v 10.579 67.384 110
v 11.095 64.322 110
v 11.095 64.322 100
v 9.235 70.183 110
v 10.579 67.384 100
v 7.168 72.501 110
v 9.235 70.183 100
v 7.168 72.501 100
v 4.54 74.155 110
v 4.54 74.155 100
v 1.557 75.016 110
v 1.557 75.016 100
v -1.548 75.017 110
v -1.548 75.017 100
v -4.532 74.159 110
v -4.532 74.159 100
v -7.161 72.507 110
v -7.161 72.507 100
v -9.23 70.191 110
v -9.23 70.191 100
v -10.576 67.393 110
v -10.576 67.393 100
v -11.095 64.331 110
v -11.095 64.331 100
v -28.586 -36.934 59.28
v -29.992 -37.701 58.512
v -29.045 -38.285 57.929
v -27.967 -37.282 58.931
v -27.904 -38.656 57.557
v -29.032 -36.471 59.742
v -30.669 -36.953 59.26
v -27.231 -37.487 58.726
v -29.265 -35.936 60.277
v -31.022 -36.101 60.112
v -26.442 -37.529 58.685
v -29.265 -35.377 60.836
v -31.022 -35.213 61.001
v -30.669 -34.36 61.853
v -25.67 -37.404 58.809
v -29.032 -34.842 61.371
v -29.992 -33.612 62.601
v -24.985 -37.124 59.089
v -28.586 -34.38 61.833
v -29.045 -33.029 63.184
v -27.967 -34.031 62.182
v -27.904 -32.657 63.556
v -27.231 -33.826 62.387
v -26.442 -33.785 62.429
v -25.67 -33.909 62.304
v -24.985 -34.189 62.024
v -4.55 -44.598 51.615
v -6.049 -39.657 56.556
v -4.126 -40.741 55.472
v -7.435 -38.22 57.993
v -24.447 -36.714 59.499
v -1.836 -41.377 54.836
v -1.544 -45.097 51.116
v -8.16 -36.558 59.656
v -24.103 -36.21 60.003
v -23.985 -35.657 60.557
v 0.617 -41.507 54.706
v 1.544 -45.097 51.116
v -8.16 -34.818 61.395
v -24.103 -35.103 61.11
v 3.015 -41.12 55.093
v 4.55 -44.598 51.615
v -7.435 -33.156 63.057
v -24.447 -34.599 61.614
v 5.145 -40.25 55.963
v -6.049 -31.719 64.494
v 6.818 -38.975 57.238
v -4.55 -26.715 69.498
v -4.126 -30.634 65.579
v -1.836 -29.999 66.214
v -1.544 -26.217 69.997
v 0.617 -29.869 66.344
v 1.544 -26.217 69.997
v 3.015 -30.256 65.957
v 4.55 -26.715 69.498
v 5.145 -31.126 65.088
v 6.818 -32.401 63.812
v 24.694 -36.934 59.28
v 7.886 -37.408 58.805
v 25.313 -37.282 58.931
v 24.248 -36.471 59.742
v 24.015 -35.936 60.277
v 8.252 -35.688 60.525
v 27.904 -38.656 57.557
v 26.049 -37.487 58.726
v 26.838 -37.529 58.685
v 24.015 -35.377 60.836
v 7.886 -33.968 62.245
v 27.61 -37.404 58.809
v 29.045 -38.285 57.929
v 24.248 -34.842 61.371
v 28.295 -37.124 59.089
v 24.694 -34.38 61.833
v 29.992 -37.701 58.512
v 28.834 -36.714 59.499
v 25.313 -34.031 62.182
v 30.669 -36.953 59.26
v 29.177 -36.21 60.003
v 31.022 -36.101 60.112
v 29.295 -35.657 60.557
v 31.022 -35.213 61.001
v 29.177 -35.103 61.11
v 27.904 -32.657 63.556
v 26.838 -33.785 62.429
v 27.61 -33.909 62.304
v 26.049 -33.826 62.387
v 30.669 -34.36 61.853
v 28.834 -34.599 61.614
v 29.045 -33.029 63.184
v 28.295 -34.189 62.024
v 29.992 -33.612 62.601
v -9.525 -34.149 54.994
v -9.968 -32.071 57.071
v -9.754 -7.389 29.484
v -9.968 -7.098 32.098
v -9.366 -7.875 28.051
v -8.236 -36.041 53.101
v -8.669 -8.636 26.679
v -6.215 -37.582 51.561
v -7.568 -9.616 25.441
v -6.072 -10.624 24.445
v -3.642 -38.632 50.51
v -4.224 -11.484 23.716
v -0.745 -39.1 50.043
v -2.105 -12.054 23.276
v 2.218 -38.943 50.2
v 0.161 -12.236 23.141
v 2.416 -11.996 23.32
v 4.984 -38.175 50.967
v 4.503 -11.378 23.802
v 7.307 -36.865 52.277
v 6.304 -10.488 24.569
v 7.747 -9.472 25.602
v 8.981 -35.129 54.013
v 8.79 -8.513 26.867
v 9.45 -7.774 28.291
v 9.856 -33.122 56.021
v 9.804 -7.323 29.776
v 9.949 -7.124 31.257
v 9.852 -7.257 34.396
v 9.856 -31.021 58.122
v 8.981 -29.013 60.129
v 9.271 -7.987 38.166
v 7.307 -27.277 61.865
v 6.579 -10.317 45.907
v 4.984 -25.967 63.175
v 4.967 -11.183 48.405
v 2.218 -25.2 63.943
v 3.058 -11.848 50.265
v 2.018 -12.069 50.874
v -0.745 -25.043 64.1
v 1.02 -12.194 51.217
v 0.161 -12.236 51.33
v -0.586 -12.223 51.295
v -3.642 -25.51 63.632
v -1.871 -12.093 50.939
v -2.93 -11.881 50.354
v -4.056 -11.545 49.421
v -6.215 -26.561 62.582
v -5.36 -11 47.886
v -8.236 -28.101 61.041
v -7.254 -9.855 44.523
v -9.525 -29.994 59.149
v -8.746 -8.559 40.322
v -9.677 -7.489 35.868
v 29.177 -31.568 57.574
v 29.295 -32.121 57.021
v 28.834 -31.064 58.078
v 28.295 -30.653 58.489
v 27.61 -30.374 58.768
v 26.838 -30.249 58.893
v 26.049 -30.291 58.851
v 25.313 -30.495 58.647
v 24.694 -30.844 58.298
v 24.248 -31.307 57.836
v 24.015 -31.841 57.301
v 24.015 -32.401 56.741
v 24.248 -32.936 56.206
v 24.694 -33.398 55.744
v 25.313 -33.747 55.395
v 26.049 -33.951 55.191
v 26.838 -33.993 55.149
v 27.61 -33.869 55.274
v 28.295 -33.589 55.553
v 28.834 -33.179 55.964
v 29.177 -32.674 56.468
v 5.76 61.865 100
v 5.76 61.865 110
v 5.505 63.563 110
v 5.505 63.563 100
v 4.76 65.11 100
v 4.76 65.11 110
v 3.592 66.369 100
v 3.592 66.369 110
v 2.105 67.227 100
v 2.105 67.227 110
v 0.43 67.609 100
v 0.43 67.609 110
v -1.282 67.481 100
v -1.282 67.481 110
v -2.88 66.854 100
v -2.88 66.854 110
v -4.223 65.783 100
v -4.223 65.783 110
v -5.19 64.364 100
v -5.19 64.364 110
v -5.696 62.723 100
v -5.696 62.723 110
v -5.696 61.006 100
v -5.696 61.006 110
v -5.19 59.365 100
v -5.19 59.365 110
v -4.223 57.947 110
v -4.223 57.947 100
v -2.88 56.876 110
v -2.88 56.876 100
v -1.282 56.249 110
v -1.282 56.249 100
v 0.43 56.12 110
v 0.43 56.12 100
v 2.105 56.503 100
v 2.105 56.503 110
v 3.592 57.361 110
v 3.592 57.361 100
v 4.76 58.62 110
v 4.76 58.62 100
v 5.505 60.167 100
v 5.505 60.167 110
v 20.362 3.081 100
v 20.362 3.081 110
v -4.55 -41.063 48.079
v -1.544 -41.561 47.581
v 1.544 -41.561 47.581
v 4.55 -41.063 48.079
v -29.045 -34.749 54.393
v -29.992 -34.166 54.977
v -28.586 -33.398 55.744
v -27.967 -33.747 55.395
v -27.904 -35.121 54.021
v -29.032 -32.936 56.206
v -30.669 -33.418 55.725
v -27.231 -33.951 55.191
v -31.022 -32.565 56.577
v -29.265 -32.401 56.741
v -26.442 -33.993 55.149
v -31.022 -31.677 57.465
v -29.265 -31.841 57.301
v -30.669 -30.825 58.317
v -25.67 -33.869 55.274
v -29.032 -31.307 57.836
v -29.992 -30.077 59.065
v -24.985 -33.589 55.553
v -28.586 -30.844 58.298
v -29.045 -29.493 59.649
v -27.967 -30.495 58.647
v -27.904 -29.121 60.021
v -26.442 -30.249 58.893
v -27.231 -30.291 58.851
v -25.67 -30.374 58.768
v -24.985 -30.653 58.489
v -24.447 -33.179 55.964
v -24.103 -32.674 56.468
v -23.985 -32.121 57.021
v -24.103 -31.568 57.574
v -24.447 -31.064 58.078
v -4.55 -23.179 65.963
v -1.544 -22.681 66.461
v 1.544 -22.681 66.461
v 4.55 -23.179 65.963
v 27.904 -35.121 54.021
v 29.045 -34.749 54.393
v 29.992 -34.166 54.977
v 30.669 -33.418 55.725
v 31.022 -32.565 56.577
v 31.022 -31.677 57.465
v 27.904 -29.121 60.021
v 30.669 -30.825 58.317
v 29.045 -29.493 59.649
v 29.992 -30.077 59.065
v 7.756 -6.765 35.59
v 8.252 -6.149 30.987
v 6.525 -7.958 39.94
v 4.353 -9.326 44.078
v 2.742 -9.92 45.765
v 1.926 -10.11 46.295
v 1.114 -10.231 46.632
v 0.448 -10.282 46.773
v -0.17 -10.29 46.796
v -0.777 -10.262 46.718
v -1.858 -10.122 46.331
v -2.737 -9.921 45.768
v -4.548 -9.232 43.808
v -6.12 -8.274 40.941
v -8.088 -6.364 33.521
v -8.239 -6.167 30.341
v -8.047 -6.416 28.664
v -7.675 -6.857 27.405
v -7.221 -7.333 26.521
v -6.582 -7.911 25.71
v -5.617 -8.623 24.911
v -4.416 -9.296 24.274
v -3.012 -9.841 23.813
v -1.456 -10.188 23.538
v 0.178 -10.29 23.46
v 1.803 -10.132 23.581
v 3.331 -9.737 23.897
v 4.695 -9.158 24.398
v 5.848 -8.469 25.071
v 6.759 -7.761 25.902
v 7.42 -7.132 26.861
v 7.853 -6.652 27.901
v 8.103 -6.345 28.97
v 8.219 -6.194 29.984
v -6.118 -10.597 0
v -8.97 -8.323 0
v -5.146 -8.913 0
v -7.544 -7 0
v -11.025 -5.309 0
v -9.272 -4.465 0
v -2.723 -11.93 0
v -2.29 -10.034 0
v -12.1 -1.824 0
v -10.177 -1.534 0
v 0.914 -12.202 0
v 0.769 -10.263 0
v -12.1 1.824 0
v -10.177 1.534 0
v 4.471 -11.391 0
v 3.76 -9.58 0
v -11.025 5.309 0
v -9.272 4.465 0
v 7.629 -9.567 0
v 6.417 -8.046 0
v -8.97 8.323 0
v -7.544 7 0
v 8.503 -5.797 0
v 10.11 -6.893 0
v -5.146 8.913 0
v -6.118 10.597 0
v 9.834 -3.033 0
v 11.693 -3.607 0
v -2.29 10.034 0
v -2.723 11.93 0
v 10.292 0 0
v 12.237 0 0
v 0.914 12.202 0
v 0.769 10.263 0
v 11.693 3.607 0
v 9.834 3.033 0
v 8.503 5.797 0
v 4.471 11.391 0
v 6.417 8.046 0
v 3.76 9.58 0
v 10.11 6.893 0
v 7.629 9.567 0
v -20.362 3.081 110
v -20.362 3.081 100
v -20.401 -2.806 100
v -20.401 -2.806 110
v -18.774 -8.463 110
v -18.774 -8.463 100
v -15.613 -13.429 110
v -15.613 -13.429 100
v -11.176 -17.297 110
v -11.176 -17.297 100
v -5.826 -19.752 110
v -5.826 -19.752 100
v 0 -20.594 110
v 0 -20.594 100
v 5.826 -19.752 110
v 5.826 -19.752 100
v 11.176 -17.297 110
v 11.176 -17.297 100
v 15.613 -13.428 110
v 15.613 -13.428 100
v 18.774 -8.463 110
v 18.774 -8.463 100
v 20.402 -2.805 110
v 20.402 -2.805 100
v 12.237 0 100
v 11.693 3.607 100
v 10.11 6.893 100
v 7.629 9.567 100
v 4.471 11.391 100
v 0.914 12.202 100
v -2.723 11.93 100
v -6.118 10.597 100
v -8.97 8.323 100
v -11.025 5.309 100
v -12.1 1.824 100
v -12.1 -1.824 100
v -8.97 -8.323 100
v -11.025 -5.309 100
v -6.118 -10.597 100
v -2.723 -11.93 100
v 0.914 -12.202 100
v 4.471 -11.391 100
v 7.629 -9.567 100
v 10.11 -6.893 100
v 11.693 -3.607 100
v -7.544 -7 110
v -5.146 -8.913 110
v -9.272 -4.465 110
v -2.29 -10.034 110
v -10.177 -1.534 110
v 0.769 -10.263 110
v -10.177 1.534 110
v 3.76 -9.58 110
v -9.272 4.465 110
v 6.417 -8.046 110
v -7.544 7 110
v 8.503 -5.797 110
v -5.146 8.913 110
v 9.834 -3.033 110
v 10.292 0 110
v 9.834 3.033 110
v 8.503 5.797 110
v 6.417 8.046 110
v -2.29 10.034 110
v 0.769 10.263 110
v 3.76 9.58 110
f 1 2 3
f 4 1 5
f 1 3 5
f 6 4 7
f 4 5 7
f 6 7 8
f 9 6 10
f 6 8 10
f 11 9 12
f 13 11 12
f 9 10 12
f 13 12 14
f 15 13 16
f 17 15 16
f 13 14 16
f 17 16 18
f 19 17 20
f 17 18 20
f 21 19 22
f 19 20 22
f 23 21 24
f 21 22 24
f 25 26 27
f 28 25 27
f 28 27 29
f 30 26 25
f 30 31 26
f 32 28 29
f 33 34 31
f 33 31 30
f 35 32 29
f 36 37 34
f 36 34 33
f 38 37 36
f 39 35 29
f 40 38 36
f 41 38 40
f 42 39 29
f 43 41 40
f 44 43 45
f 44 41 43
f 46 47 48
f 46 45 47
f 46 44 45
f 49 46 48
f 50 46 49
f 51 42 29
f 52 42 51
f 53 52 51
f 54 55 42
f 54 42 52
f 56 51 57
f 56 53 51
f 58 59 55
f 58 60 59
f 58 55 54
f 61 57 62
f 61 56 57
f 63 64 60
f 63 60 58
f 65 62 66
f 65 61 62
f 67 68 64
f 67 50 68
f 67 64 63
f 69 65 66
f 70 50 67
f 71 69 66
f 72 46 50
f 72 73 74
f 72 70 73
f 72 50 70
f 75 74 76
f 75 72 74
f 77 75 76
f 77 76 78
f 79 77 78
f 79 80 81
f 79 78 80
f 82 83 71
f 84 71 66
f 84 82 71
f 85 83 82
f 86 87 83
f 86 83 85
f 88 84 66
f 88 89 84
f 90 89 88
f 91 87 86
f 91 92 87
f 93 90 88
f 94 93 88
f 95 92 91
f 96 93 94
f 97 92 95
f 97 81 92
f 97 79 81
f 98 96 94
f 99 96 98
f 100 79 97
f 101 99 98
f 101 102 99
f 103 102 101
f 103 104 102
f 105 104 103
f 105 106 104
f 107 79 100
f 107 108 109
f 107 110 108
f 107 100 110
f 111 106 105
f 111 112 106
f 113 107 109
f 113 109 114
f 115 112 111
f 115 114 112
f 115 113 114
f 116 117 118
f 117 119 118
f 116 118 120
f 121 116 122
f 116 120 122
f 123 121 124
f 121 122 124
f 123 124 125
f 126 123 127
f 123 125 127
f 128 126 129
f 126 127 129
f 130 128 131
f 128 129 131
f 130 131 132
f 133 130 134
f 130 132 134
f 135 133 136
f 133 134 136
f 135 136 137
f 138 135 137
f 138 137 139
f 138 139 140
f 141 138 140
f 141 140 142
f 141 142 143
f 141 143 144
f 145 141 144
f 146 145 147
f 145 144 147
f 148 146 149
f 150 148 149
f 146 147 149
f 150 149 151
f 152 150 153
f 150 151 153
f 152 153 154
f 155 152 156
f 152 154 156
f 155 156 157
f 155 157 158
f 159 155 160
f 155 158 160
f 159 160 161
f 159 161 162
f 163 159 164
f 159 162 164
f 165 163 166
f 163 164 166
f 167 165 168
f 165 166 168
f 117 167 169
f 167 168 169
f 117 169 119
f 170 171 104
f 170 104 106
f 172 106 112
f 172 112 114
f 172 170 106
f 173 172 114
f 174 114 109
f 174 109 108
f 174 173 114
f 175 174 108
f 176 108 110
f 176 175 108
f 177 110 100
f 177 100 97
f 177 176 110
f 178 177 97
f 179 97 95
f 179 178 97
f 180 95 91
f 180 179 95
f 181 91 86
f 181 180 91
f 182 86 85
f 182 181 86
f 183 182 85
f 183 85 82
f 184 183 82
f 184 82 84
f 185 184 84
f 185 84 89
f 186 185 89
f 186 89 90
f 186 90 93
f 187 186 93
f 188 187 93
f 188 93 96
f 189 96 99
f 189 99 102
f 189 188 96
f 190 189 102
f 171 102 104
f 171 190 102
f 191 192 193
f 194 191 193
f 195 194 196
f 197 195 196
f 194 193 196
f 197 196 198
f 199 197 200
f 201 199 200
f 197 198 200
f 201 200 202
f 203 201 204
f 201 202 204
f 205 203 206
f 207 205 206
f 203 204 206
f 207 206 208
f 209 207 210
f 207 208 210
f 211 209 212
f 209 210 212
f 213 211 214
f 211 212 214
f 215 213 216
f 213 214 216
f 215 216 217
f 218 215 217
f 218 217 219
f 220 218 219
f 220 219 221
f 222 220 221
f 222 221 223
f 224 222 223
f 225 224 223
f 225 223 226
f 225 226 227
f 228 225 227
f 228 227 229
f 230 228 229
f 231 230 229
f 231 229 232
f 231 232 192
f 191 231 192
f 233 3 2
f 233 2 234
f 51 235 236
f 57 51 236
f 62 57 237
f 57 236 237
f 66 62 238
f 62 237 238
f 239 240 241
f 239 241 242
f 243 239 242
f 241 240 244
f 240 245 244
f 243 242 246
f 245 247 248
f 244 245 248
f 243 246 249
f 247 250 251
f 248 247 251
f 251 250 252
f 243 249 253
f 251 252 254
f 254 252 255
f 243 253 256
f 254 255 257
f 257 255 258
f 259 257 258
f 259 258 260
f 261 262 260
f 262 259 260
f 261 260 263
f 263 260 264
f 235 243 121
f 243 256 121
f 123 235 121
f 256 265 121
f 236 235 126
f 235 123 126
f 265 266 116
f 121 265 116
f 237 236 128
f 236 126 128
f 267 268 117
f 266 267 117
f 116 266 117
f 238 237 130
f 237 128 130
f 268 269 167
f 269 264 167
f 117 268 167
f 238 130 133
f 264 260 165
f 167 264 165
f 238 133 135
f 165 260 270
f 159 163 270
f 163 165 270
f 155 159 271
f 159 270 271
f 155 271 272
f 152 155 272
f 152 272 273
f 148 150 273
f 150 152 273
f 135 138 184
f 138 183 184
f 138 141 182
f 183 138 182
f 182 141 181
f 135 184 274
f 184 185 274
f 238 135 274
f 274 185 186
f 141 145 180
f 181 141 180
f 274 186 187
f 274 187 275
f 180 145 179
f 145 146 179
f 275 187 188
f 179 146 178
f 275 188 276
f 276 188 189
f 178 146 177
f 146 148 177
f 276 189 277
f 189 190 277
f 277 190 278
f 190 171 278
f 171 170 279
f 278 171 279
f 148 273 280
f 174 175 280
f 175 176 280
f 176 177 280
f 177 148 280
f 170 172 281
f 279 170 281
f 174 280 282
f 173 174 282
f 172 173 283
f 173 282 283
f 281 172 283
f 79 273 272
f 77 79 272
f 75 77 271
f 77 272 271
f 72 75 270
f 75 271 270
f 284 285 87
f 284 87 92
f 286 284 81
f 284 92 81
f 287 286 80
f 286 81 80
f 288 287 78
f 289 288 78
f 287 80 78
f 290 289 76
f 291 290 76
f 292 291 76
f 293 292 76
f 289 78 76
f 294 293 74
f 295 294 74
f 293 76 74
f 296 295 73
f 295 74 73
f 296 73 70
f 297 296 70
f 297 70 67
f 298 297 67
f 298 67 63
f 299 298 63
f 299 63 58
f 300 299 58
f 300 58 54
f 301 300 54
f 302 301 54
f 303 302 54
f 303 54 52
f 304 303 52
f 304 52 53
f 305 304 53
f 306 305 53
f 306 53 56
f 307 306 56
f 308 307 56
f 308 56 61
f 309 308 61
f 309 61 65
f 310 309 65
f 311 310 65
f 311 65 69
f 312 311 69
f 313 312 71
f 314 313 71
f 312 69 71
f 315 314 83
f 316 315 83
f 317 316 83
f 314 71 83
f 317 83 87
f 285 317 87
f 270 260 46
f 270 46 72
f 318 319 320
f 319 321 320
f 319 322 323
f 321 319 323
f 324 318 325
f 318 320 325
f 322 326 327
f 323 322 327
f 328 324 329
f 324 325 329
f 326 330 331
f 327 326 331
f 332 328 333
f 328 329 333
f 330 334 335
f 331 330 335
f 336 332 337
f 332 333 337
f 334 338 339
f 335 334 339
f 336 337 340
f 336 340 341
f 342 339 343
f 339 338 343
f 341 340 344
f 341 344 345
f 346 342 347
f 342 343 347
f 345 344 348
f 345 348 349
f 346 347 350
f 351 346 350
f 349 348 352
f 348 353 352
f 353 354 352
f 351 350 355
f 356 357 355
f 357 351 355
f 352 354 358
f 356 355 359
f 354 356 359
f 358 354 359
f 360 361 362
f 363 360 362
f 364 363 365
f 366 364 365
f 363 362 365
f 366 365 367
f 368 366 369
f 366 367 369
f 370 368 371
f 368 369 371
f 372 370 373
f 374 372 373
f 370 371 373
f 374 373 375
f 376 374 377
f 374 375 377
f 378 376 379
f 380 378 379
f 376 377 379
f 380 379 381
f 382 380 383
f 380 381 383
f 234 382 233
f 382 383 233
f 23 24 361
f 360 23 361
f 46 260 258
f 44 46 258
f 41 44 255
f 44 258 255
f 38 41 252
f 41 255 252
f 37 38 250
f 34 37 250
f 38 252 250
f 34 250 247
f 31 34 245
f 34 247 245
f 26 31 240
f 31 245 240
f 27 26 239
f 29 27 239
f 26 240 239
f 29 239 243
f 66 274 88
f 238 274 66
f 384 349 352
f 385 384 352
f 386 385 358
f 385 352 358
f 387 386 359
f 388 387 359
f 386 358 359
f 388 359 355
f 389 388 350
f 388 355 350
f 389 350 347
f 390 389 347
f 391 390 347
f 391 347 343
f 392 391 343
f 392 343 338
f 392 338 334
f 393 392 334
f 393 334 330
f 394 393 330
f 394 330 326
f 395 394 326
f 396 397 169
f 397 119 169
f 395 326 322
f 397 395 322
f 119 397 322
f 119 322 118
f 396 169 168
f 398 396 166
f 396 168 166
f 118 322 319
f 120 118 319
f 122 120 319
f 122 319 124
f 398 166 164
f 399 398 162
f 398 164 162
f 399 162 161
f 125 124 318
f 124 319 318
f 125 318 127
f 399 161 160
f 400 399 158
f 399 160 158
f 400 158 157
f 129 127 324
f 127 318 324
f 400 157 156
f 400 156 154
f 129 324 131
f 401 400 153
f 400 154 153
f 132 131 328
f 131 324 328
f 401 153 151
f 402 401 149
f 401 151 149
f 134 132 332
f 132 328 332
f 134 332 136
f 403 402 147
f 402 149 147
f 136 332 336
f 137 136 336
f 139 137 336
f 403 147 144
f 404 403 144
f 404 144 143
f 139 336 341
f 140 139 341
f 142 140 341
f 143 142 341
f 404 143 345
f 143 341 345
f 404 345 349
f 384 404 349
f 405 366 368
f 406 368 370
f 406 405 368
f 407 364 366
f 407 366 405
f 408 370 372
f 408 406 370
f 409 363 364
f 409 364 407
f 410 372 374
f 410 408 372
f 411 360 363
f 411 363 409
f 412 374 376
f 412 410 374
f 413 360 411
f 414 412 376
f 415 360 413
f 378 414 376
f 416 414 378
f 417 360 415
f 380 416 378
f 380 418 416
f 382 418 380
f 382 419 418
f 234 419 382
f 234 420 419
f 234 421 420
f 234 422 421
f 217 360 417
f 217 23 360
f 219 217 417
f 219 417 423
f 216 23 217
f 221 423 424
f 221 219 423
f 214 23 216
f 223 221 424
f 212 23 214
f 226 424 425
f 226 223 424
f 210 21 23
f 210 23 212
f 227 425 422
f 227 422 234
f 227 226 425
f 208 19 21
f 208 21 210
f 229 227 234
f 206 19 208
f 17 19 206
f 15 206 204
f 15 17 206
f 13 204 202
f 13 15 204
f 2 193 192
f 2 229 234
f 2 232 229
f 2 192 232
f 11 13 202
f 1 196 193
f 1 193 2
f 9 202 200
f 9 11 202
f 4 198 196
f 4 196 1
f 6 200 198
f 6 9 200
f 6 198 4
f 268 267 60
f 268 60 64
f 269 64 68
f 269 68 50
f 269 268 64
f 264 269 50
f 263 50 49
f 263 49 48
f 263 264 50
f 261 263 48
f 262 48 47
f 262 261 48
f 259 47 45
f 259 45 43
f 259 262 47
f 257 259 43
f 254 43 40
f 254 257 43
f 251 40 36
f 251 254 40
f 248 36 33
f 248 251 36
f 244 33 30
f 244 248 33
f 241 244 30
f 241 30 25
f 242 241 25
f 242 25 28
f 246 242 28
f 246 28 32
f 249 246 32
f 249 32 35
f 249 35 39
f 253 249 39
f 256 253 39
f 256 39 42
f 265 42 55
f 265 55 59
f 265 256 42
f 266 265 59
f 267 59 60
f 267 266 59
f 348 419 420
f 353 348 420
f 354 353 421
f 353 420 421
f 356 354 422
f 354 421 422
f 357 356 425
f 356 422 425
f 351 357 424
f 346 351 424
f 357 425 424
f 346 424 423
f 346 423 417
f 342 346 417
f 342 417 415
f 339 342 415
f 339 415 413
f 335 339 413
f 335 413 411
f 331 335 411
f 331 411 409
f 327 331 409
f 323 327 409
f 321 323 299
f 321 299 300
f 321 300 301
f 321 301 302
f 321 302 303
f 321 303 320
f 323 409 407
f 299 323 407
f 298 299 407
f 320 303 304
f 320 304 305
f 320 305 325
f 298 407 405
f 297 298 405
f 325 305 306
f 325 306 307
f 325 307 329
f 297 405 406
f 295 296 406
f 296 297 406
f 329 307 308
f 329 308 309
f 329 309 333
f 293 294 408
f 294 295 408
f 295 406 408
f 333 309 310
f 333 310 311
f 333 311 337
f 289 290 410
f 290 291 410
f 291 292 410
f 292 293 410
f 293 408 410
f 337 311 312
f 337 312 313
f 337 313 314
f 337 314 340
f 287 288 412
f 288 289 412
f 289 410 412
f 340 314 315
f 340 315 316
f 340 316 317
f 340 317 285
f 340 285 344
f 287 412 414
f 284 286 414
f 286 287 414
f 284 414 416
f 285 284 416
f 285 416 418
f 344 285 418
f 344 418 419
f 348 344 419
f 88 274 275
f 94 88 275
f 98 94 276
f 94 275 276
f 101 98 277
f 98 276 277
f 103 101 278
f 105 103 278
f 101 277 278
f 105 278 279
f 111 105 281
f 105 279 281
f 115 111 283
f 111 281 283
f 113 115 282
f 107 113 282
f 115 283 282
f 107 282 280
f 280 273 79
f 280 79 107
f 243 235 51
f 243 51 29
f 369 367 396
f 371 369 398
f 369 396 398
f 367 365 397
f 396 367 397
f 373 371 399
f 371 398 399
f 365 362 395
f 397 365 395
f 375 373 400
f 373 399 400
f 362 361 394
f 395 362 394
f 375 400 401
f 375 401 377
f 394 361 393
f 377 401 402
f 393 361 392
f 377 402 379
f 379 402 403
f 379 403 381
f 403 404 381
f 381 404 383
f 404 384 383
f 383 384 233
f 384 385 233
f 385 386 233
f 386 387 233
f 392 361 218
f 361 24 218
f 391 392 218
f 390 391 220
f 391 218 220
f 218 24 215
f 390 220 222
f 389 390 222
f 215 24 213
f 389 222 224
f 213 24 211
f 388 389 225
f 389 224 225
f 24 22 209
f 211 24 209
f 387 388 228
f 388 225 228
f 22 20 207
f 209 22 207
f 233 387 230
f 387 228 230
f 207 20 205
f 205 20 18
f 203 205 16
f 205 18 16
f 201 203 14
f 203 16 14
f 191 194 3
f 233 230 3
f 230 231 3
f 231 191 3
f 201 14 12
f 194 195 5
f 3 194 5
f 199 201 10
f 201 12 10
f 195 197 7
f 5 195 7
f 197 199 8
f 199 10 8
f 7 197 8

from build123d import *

# Parameters (mm, degrees)
SKETCH_R          = 12.236691
PAD_DEPTH         = 100
PAD001_DEPTH      = 10
SKETCH002_R       = 9.967721
PAD002_DEPTH      = 31
PAD002_DEPTH_BACK = -10
SKETCH003_R       = 2.654836
PAD003_DEPTH      = 5
SKETCH004_R       = 10.291555
SKETCH004_R_2     = 5.760448
POCKET_DEPTH      = 110.001
SKETCH005_R       = 8.252369
POCKET001_DEPTH   = 56


with BuildPart() as part:
    # Sketch → Pad (new body)
    with BuildSketch(Plane.XY):
        Circle(SKETCH_R)
    extrude(amount=PAD_DEPTH)

    # Sketch001 (on Face3 of Pad) → Pad001 (join)
    with BuildSketch(Plane.XY.offset(100)):
        with BuildLine():
            ThreePointArc((-20.361812, 3.080584), (0.000187, -20.593527), (20.361756, 3.080953))
            Line((11.095306, 64.322127), (20.361756, 3.080953))
            ThreePointArc((11.095306, 64.322127), (0.004574, 75.125929), (-11.095059, 64.33127))
            Line((-11.095059, 64.33127), (-20.361812, 3.080584))
        make_face()
    extrude(amount=PAD001_DEPTH)

    # Sketch002 (on DatumPlane) → Pad002 (join, two sides)
    with BuildSketch(Plane(origin=(0, -25, 50), x_dir=(-1, 0, 0), z_dir=(0, -0.707107, 0.707107))) as pad002_sk:
        Circle(SKETCH002_R)
    extrude(amount=-PAD002_DEPTH)
    extrude(pad002_sk.sketch, amount=-PAD002_DEPTH_BACK)

    # Sketch003 (on Face10 of Pad002) → Pad003 (join)
    with BuildSketch(Plane(origin=(0, -44.571068, 44.571068), x_dir=(1, 0, 0), z_dir=(0, -0.707107, 0.707107))):
        with BuildLine():
            ThreePointArc((4.5502, 30.252493), (0, 31.046218), (-4.5502, 30.252493))
            Line((-27.904433, 21.84908), (-4.5502, 30.252493))
            ThreePointArc((-27.904433, 21.84908), (-31.066679, 17.606865), (-27.904433, 13.36465))
            Line((-4.5502, 4.961238), (-27.904433, 13.36465))
            ThreePointArc((-4.5502, 4.961238), (0, 4.167512), (4.5502, 4.961238))
            Line((27.904433, 13.36465), (4.5502, 4.961238))
            ThreePointArc((27.904433, 13.36465), (31.066679, 17.606865), (27.904433, 21.84908))
            Line((4.5502, 30.252493), (27.904433, 21.84908))
        make_face()
        with Locations((-26.640049, 17.606865)):
            Circle(SKETCH003_R, mode=Mode.SUBTRACT)
        with Locations((26.640049, 17.606865)):
            Circle(SKETCH003_R, mode=Mode.SUBTRACT)
    extrude(amount=PAD003_DEPTH)

    # Sketch004 (on Face21 of Pad003) → Pocket (cut, through all)
    with BuildSketch(Plane.XY.offset(110)):
        Circle(SKETCH004_R)
        with Locations((0, 61.864815)):
            Circle(SKETCH004_R_2)
    extrude(amount=-POCKET_DEPTH, mode=Mode.SUBTRACT)

    # Sketch005 (on Face5 of Pocket) → Pocket001 (cut)
    with BuildSketch(Plane(origin=(0, -48.106602, 48.106602), x_dir=(1, 0, 0), z_dir=(0, -0.707107, 0.707107))):
        with Locations((0, 17.562706)):
            Circle(SKETCH005_R)
    extrude(amount=-POCKET001_DEPTH, mode=Mode.SUBTRACT)


solid = part.part
